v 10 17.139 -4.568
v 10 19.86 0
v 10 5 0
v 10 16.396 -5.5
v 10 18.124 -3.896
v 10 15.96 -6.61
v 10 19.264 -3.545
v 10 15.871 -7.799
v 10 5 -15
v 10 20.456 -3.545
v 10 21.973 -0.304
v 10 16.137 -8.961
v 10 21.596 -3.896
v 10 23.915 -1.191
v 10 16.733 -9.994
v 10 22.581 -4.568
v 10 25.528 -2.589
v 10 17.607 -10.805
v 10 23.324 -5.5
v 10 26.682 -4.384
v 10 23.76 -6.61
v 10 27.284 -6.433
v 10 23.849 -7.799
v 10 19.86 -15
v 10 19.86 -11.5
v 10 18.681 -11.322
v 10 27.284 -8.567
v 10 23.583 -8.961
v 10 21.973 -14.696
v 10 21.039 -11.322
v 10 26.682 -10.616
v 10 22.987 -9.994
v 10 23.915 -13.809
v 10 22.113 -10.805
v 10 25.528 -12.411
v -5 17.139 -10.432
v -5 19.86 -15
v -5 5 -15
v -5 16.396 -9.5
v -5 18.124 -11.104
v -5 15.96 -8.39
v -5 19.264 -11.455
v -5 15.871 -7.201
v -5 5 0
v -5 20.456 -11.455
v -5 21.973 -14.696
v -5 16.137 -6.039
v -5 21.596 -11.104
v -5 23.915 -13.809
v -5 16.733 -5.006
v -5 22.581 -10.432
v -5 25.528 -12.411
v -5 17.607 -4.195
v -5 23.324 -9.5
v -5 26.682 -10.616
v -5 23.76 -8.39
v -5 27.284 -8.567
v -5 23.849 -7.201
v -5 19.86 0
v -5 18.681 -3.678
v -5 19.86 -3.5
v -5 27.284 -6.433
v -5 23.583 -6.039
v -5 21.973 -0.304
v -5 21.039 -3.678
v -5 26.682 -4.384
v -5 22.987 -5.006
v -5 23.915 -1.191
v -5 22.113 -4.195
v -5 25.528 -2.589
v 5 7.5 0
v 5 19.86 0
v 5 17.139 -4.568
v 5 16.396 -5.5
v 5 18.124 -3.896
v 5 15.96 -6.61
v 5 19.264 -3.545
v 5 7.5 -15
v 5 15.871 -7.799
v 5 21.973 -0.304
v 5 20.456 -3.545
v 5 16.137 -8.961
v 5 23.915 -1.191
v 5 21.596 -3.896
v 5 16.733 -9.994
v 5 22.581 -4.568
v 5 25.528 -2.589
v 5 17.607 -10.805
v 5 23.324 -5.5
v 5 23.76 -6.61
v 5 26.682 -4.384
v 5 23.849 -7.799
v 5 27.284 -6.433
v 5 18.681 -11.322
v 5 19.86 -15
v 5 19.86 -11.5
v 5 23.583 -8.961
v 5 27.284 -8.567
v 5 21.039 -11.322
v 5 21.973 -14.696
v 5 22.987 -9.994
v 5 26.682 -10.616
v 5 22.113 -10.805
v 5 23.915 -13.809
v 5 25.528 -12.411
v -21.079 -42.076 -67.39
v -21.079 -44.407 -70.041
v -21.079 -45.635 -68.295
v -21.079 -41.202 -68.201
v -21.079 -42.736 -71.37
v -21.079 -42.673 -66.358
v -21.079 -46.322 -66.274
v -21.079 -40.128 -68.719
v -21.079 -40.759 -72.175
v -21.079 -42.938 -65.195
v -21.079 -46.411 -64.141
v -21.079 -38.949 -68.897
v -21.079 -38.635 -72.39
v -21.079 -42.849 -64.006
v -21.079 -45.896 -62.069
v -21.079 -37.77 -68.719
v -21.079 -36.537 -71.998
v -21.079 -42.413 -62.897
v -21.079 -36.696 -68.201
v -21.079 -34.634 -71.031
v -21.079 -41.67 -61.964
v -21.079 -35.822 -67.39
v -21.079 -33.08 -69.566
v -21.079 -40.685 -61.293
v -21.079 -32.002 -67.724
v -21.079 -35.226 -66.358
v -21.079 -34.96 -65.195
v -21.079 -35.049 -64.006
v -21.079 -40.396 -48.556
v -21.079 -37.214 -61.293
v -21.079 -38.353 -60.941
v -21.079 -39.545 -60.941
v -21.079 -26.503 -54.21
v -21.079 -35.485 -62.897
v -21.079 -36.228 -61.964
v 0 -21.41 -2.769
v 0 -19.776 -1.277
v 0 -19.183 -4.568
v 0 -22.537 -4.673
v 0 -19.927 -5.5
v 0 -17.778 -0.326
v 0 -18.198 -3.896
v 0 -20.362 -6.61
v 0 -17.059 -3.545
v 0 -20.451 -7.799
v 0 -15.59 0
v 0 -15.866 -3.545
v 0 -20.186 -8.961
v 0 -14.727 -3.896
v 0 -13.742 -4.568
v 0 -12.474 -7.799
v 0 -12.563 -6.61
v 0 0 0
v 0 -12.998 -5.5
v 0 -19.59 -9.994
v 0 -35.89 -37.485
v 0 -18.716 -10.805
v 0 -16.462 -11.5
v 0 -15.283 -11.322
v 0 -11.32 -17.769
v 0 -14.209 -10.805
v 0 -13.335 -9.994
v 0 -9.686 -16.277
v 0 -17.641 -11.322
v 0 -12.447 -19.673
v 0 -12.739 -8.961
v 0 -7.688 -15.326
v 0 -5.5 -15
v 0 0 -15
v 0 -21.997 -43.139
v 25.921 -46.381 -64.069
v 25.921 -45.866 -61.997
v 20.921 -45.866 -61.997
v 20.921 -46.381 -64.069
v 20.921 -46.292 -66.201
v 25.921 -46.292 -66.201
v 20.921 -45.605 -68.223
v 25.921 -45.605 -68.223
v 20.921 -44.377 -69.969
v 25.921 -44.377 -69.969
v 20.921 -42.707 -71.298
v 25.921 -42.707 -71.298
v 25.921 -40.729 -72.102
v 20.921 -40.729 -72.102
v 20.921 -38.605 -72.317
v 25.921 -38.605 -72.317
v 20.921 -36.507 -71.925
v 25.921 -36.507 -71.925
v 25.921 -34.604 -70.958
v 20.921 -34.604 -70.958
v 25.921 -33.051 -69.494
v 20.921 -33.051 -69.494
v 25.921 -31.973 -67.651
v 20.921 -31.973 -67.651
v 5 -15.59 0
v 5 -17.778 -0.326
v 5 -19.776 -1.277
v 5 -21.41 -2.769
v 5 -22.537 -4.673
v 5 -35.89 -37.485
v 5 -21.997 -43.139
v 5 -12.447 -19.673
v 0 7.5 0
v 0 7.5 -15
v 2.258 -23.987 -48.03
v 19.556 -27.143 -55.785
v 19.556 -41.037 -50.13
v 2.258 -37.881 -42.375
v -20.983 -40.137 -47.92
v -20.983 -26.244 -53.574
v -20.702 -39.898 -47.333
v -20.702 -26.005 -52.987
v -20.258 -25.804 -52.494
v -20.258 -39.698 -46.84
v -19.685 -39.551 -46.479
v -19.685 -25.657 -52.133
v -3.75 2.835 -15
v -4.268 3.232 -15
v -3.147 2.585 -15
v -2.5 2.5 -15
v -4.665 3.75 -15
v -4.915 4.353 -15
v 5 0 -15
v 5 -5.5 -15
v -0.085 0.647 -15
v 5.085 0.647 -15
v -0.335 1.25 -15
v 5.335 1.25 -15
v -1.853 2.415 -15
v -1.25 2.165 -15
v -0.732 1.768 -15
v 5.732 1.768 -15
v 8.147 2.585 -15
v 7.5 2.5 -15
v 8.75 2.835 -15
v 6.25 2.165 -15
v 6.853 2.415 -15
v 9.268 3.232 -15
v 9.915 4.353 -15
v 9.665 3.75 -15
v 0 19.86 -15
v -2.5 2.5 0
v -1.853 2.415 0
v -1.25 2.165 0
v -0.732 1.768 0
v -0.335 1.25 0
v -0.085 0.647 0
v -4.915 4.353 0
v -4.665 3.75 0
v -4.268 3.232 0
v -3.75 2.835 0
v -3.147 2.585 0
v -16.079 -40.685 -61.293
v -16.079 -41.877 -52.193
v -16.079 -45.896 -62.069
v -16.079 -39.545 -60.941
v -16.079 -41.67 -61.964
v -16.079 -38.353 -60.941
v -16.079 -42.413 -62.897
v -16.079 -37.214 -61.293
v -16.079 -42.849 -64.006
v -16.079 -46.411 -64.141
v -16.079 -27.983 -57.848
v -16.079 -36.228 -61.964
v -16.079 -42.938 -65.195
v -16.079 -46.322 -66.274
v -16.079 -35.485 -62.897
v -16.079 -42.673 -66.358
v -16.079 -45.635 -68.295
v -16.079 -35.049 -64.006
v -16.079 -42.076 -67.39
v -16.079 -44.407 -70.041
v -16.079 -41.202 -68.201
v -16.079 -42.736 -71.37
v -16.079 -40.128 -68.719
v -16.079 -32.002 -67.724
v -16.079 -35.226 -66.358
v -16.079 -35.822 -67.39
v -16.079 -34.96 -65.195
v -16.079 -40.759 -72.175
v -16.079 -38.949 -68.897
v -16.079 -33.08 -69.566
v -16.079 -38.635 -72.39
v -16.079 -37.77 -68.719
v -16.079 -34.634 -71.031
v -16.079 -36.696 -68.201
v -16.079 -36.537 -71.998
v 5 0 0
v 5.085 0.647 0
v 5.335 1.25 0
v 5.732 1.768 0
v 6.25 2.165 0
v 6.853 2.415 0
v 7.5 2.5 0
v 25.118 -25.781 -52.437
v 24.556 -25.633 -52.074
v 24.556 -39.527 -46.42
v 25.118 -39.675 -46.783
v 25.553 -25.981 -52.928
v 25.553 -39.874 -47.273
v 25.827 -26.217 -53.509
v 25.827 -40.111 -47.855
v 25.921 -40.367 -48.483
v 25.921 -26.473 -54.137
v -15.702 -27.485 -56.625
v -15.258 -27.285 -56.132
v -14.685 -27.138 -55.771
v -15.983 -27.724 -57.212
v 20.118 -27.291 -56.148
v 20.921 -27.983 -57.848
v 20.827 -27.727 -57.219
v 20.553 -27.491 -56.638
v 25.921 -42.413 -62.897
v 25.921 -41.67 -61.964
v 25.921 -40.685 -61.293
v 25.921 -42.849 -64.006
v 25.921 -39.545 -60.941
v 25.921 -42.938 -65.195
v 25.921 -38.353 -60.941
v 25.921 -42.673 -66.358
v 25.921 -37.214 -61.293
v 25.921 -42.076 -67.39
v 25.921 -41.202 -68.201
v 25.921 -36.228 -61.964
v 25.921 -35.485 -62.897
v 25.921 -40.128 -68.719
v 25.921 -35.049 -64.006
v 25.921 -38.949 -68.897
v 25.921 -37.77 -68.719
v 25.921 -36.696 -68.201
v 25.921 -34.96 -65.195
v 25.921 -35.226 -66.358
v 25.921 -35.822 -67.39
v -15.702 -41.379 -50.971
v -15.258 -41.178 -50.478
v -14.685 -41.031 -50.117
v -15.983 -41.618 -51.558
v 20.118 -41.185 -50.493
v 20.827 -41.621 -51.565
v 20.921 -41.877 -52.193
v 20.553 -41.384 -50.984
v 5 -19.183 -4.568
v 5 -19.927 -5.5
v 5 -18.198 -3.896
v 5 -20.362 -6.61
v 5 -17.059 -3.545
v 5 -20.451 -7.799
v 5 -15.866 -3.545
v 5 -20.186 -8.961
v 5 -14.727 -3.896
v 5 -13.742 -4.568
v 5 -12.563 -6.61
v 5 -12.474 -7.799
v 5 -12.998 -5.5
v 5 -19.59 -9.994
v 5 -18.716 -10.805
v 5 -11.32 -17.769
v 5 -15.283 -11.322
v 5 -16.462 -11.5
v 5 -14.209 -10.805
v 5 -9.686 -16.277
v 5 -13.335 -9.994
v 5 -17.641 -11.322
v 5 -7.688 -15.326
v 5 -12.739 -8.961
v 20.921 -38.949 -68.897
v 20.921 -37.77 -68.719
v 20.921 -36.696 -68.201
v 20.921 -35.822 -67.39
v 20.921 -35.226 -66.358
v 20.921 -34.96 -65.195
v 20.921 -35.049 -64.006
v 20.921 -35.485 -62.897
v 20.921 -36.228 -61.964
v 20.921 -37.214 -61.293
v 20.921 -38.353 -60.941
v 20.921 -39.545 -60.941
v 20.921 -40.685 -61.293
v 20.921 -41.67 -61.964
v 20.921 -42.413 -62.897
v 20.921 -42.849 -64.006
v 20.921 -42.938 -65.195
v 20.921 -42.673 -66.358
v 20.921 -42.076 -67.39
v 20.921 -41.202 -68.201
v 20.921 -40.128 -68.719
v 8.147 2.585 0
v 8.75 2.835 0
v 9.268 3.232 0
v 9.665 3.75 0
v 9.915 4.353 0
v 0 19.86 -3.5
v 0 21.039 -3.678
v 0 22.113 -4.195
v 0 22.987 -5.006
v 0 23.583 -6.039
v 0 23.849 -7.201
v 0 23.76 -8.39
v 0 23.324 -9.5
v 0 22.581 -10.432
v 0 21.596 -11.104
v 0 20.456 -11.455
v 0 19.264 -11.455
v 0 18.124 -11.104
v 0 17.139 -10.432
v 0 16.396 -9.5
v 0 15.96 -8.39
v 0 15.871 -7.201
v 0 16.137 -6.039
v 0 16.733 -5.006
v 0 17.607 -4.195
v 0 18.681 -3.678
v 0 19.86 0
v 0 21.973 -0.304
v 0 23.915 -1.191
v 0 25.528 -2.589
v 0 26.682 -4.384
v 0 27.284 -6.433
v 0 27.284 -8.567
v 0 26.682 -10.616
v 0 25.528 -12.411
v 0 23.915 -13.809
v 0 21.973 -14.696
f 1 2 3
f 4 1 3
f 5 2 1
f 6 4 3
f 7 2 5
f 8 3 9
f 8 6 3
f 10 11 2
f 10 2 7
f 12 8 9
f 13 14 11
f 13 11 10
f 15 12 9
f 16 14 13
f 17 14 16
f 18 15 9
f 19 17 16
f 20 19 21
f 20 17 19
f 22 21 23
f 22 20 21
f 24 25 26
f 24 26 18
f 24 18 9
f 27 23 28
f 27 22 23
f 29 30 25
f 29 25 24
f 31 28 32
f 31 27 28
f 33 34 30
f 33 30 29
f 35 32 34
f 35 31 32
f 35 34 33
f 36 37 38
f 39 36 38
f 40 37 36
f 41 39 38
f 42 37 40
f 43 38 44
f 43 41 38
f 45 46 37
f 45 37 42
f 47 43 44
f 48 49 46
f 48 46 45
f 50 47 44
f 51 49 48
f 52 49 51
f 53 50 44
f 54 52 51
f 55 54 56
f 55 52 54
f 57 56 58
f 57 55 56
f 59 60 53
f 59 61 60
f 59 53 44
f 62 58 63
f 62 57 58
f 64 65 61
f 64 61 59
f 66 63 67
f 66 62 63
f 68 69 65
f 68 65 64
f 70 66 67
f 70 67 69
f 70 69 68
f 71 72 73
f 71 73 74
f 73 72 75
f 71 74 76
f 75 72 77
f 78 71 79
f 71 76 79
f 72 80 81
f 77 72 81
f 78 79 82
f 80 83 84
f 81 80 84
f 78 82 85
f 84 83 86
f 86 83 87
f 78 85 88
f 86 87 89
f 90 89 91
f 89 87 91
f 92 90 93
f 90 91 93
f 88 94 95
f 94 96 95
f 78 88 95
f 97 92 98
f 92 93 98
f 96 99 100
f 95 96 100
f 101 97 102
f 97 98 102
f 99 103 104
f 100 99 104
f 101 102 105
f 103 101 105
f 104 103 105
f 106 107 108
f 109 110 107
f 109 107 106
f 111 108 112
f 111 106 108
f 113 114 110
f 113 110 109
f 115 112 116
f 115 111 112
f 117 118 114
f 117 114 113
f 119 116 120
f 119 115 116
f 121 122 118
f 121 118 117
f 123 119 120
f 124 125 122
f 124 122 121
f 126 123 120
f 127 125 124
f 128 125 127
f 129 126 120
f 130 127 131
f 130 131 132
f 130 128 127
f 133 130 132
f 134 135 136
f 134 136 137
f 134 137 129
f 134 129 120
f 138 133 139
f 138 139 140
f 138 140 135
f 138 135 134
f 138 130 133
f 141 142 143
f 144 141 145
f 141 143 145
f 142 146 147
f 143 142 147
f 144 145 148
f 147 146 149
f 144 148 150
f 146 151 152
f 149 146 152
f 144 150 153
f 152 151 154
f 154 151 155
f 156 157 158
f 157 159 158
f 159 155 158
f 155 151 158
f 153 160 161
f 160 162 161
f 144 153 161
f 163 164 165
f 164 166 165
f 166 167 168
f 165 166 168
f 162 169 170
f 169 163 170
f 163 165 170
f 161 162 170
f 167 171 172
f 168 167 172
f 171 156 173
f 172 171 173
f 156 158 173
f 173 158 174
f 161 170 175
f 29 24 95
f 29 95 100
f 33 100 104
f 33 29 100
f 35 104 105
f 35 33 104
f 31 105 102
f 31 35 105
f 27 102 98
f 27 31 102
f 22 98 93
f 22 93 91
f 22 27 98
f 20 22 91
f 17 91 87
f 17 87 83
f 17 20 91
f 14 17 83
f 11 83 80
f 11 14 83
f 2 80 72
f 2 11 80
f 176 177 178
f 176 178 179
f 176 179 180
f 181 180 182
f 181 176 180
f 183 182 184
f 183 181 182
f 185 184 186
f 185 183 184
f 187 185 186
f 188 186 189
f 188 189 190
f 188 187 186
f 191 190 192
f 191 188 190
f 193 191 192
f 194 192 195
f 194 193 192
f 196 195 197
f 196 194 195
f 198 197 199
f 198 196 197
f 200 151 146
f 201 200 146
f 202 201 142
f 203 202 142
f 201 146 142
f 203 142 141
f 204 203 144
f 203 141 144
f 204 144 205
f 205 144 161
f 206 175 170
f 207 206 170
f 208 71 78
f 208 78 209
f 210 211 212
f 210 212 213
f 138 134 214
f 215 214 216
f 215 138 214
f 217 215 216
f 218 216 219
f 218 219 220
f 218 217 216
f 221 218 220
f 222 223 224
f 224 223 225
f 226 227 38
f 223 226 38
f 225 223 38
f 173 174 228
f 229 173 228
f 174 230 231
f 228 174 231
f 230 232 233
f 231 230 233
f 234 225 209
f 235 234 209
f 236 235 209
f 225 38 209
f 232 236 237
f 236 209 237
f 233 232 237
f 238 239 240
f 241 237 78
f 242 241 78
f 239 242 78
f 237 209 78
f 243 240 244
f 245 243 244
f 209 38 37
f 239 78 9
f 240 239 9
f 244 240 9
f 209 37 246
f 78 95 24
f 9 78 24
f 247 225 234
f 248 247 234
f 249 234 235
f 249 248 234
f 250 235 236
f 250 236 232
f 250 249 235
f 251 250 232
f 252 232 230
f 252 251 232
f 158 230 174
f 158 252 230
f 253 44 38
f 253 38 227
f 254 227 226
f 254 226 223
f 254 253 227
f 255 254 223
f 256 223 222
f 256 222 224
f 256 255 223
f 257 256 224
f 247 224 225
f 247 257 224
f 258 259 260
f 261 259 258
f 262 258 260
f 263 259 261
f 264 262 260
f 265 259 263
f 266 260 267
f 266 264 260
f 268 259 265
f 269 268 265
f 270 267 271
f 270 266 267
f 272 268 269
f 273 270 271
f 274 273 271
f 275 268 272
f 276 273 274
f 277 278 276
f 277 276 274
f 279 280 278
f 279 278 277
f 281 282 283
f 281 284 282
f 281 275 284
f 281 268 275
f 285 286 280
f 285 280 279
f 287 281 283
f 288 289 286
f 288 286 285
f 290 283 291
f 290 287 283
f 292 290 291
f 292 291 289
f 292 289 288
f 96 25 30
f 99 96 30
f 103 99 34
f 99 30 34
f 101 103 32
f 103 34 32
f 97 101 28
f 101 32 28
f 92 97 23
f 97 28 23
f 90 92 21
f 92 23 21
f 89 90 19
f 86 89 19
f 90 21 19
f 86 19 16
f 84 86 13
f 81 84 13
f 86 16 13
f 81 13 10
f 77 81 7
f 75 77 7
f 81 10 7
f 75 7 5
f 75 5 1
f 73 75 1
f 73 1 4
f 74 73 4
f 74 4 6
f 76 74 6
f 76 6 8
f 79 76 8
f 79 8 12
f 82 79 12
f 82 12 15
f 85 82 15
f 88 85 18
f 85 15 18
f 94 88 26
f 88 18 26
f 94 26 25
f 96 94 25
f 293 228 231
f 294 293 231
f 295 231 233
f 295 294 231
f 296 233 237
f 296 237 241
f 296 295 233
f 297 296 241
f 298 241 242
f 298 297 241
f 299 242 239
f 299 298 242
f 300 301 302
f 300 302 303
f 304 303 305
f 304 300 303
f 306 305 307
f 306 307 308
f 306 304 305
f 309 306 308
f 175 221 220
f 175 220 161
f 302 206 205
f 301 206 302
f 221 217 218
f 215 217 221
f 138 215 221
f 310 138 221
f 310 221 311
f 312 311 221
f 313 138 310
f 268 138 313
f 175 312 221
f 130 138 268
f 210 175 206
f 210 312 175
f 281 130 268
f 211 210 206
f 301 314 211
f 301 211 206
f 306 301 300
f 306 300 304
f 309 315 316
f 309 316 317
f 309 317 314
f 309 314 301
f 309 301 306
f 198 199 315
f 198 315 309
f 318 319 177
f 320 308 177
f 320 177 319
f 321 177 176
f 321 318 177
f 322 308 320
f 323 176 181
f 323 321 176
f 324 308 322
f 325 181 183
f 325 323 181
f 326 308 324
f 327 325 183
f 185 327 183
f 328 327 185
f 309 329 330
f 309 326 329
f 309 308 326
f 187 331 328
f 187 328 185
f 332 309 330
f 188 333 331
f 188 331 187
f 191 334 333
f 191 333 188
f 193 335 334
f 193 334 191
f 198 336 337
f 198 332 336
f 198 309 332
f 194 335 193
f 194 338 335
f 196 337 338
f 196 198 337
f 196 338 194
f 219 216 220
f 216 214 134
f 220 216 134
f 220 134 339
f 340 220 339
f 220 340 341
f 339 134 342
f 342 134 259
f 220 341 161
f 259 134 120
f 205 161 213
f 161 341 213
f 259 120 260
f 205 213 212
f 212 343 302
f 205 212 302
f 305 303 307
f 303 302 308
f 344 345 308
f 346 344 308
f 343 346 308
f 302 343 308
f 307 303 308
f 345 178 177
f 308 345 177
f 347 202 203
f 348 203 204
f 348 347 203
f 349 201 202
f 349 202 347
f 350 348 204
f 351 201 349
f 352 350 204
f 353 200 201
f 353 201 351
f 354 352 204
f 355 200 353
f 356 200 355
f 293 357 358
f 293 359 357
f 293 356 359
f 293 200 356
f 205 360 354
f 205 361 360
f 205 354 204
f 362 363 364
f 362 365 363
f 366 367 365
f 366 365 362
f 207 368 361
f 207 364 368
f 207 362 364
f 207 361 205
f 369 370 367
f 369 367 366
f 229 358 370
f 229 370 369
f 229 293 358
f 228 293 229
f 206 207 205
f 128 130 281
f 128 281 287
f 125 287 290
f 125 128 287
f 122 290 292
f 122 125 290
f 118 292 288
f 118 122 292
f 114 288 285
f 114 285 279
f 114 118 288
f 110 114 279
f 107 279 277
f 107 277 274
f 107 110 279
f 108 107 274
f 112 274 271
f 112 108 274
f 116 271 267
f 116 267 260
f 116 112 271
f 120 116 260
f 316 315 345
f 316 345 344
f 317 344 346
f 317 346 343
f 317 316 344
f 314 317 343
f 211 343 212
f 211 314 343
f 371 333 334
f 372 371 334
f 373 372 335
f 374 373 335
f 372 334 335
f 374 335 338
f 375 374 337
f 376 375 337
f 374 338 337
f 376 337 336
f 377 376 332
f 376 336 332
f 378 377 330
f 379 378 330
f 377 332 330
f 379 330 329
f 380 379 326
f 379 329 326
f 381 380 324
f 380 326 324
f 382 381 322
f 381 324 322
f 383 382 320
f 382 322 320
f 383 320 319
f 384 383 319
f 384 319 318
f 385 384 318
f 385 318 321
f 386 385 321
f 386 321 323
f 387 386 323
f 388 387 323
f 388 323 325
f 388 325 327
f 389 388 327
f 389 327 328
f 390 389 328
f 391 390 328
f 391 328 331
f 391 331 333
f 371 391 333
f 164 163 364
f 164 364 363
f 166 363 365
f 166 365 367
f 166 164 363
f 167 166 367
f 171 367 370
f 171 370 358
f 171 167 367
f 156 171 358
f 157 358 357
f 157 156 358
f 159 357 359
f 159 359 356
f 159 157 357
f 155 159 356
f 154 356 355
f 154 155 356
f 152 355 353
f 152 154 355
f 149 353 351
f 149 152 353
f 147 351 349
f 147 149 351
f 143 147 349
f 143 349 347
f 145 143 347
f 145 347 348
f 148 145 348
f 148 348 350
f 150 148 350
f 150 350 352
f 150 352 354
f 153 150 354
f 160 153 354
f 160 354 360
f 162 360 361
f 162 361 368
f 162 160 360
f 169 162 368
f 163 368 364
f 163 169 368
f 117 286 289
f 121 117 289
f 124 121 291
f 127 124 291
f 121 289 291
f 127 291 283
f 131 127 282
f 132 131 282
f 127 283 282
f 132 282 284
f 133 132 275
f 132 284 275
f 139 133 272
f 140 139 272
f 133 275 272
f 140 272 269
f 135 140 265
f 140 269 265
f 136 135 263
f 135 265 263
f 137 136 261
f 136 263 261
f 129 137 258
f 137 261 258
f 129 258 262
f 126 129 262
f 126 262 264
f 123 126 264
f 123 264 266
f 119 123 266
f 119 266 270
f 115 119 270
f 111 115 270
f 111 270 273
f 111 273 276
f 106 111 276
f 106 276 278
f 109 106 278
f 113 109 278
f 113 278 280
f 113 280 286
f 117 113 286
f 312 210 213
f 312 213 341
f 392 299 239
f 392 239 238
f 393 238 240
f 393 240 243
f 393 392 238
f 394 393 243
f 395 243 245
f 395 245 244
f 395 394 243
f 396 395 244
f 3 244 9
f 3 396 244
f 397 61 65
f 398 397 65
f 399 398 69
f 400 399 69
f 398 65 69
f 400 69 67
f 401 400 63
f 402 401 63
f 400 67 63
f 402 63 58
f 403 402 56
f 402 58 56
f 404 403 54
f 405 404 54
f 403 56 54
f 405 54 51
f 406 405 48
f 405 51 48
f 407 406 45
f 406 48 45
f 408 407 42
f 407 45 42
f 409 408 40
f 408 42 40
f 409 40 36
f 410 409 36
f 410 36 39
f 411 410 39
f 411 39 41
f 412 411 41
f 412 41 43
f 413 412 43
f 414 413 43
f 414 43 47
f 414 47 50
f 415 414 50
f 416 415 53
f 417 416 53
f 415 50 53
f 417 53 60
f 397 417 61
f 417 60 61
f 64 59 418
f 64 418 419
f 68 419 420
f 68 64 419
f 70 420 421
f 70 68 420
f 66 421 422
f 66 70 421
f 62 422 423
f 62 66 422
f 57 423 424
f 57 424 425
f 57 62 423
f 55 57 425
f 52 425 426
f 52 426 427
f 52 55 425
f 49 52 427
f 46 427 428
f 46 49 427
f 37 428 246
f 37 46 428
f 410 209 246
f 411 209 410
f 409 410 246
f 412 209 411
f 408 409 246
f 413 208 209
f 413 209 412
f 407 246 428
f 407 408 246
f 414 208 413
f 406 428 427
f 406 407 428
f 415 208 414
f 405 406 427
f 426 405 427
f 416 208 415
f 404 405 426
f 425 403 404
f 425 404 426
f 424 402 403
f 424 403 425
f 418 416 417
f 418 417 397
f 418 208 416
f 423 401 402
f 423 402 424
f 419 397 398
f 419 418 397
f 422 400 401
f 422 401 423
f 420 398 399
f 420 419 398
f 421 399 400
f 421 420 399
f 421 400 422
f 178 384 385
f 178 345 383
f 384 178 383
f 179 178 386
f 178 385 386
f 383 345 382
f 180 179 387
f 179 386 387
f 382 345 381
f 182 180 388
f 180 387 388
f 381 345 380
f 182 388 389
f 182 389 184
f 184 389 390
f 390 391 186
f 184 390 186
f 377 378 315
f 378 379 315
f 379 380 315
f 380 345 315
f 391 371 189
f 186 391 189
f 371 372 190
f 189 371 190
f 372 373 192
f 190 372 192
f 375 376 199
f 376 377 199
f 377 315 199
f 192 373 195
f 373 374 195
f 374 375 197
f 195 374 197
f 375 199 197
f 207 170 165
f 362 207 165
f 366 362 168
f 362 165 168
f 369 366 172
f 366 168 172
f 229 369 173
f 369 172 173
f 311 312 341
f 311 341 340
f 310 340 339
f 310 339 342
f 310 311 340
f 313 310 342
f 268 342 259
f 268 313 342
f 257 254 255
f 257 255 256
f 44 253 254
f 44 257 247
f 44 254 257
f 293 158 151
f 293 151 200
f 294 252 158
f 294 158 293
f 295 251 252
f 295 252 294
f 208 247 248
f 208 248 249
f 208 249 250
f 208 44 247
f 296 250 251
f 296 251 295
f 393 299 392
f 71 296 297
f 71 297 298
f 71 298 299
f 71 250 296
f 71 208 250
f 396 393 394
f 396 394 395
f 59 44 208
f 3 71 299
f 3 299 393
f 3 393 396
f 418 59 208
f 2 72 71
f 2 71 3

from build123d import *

# Parameters (mm, degrees)
SKETCH1_R           = 4
BOSS_EXTRUDE1_DEPTH = 5
BOSS_EXTRUDE2_DEPTH = 15
SKETCH3_R           = 7.5
SKETCH3_R_2         = 4
BOSS_EXTRUDE3_DEPTH = 5
SKETCH5_R           = 4
CUT_EXTRUDE1_DEPTH  = 5
SKETCH6_R           = 7.5
BOSS_EXTRUDE4_DEPTH = 5
SKETCH7_R           = 4
CUT_EXTRUDE2_DEPTH  = 5
BOSS_EXTRUDE5_DEPTH = 15
SKETCH9_R           = 7.5
BOSS_EXTRUDE6_DEPTH = 5
SKETCH10_R          = 7.5
BOSS_EXTRUDE7_DEPTH = 5
SKETCH11_R          = 4
CUT_EXTRUDE3_DEPTH  = 64


with BuildPart() as part:
    # Sketch1 → Boss-Extrude1 (new body)
    with BuildSketch(Plane(origin=(0, 0, 0), x_dir=(0, 0, -1), z_dir=(1, 0, 0))):
        with BuildLine():
            Line((15, 0), (0, 0))
            Line((0, 0), (0, -15.59))
            ThreePointArc((0, -15.59), (1.276909506, -19.776065539), (4.672838586, -22.536737244))
            Line((4.672838586, -22.536737244), (37.484806943, -35.890449582))
            Line((37.484806943, -35.890449582), (43.13912977, -21.996975093))
            Line((43.13912977, -21.996975093), (19.672838586, -12.446737244))
            ThreePointArc((19.672838586, -12.446737244), (16.276909506, -9.686065539), (15, -5.5))
            Line((15, -5.5), (15, 0))
        make_face()
        with Locations((7.5, -16.462434129)):
            Circle(SKETCH1_R, mode=Mode.SUBTRACT)
    extrude(amount=BOSS_EXTRUDE1_DEPTH)

    # Sketch2 → Boss-Extrude2 (add)
    with BuildSketch(Plane.XY):
        with BuildLine():
            Line((0, 0), (5, 0))
            ThreePointArc((5, 0), (5.732233047, 1.767766953), (7.5, 2.5))
            ThreePointArc((7.5, 2.5), (9.267766953, 3.232233047), (10, 5))
            Line((10, 5), (10, 19.86))
            Line((10, 19.86), (5, 19.86))
            Line((5, 19.86), (5, 7.5))
            Line((5, 7.5), (0, 7.5))
            Line((0, 7.5), (0, 19.86))
            Line((0, 19.86), (-5, 19.86))
            Line((-5, 19.86), (-5, 5))
            ThreePointArc((-5, 5), (-4.267766953, 3.232233047), (-2.5, 2.5))
            ThreePointArc((-2.5, 2.5), (-0.732233047, 1.767766953), (0, 0))
        make_face()
    extrude(amount=-BOSS_EXTRUDE2_DEPTH)

    # Sketch3 → Boss-Extrude3 (add)
    with BuildSketch(Plane(origin=(10, 0, 0), x_dir=(0, 0, -1), z_dir=(1, 0, 0))):
        with Locations((7.5, 19.86)):
            Circle(SKETCH3_R)
        with Locations((7.5, 19.86)):
            Circle(SKETCH3_R_2, mode=Mode.SUBTRACT)
    extrude(amount=-BOSS_EXTRUDE3_DEPTH)

    # Sketch5 → Cut-Extrude1 (cut)
    with BuildSketch(Plane(origin=(10, 0, 0), x_dir=(0, 0, -1), z_dir=(1, 0, 0))):
        with Locations((7.5, 19.86)):
            Circle(SKETCH5_R)
    extrude(amount=-CUT_EXTRUDE1_DEPTH, mode=Mode.SUBTRACT)

    # Sketch6 → Boss-Extrude4 (add)
    with BuildSketch(Plane.ZY.offset(5)):
        with Locations((-7.5, 19.86)):
            Circle(SKETCH6_R)
    extrude(amount=-BOSS_EXTRUDE4_DEPTH)

    # Sketch7 → Cut-Extrude2 (cut)
    with BuildSketch(Plane.ZY.offset(5)):
        with Locations((-7.5, 19.86)):
            Circle(SKETCH7_R)
    extrude(amount=-CUT_EXTRUDE2_DEPTH, mode=Mode.SUBTRACT)

    # Sketch8 → Boss-Extrude5 (add)
    with BuildSketch(Plane(origin=(0, -3.809395954, 1.55033606), x_dir=(1, 0, 0), z_dir=(0, 0.926231633, -0.376954855))):
        with BuildLine():
            Line((0, 48.248693155), (5, 48.248693155))
            Line((5, 48.248693155), (24.55634321, 57.895622609))
            ThreePointArc((24.55634321, 57.895622609), (25.552769913, 58.816883816), (25.92108759, 60.122996551))
            Line((25.92108759, 60.122996551), (25.92108759, 74.712996551))
            Line((25.92108759, 74.712996551), (20.92108759, 74.712996551))
            Line((20.92108759, 74.712996551), (20.92108759, 64.128787942))
            ThreePointArc((20.92108759, 64.128787942), (20.552769913, 62.822675208), (19.55634321, 61.901414001))
            Line((19.55634321, 61.901414001), (2.258260879, 53.528693155))
            Line((2.258260879, 53.528693155), (-14.685235236, 61.886733815))
            ThreePointArc((-14.685235236, 61.886733815), (-15.702336235, 62.808740922), (-16.079254544, 64.128787942))
            Line((-16.079254544, 64.128787942), (-16.079254544, 74.791257758))
            Line((-16.079254544, 74.791257758), (-21.079254544, 74.791257758))
            Line((-21.079254544, 74.791257758), (-21.079254544, 60.201257758))
            ThreePointArc((-21.079254544, 60.201257758), (-20.702336235, 58.881210738), (-19.685235236, 57.95920363))
            Line((-19.685235236, 57.95920363), (0, 48.248693155))
        make_face()
    extrude(amount=-BOSS_EXTRUDE5_DEPTH)

    # Sketch9 → Boss-Extrude6 (add)
    with BuildSketch(Plane(origin=(25.92108759, 0, 0), x_dir=(0, 0, -1), z_dir=(1, 0, 0))):
        with Locations((64.824043295, -38.919559991)):
            Circle(SKETCH9_R)
    extrude(amount=-BOSS_EXTRUDE6_DEPTH)

    # Sketch10 → Boss-Extrude7 (add)
    with BuildSketch(Plane.ZY.offset(21.079254544)):
        with Locations((-64.896531301, -38.949060933)):
            Circle(SKETCH10_R)
    extrude(amount=-BOSS_EXTRUDE7_DEPTH)

    # Sketch11 → Cut-Extrude3 (cut)
    with BuildSketch(Plane(origin=(25.92108759, 0, 0), x_dir=(0, 0, -1), z_dir=(1, 0, 0))):
        with Locations((64.896531301, -38.949060933)):
            Circle(SKETCH11_R)
    extrude(amount=-CUT_EXTRUDE3_DEPTH, mode=Mode.SUBTRACT)


solid = part.part
